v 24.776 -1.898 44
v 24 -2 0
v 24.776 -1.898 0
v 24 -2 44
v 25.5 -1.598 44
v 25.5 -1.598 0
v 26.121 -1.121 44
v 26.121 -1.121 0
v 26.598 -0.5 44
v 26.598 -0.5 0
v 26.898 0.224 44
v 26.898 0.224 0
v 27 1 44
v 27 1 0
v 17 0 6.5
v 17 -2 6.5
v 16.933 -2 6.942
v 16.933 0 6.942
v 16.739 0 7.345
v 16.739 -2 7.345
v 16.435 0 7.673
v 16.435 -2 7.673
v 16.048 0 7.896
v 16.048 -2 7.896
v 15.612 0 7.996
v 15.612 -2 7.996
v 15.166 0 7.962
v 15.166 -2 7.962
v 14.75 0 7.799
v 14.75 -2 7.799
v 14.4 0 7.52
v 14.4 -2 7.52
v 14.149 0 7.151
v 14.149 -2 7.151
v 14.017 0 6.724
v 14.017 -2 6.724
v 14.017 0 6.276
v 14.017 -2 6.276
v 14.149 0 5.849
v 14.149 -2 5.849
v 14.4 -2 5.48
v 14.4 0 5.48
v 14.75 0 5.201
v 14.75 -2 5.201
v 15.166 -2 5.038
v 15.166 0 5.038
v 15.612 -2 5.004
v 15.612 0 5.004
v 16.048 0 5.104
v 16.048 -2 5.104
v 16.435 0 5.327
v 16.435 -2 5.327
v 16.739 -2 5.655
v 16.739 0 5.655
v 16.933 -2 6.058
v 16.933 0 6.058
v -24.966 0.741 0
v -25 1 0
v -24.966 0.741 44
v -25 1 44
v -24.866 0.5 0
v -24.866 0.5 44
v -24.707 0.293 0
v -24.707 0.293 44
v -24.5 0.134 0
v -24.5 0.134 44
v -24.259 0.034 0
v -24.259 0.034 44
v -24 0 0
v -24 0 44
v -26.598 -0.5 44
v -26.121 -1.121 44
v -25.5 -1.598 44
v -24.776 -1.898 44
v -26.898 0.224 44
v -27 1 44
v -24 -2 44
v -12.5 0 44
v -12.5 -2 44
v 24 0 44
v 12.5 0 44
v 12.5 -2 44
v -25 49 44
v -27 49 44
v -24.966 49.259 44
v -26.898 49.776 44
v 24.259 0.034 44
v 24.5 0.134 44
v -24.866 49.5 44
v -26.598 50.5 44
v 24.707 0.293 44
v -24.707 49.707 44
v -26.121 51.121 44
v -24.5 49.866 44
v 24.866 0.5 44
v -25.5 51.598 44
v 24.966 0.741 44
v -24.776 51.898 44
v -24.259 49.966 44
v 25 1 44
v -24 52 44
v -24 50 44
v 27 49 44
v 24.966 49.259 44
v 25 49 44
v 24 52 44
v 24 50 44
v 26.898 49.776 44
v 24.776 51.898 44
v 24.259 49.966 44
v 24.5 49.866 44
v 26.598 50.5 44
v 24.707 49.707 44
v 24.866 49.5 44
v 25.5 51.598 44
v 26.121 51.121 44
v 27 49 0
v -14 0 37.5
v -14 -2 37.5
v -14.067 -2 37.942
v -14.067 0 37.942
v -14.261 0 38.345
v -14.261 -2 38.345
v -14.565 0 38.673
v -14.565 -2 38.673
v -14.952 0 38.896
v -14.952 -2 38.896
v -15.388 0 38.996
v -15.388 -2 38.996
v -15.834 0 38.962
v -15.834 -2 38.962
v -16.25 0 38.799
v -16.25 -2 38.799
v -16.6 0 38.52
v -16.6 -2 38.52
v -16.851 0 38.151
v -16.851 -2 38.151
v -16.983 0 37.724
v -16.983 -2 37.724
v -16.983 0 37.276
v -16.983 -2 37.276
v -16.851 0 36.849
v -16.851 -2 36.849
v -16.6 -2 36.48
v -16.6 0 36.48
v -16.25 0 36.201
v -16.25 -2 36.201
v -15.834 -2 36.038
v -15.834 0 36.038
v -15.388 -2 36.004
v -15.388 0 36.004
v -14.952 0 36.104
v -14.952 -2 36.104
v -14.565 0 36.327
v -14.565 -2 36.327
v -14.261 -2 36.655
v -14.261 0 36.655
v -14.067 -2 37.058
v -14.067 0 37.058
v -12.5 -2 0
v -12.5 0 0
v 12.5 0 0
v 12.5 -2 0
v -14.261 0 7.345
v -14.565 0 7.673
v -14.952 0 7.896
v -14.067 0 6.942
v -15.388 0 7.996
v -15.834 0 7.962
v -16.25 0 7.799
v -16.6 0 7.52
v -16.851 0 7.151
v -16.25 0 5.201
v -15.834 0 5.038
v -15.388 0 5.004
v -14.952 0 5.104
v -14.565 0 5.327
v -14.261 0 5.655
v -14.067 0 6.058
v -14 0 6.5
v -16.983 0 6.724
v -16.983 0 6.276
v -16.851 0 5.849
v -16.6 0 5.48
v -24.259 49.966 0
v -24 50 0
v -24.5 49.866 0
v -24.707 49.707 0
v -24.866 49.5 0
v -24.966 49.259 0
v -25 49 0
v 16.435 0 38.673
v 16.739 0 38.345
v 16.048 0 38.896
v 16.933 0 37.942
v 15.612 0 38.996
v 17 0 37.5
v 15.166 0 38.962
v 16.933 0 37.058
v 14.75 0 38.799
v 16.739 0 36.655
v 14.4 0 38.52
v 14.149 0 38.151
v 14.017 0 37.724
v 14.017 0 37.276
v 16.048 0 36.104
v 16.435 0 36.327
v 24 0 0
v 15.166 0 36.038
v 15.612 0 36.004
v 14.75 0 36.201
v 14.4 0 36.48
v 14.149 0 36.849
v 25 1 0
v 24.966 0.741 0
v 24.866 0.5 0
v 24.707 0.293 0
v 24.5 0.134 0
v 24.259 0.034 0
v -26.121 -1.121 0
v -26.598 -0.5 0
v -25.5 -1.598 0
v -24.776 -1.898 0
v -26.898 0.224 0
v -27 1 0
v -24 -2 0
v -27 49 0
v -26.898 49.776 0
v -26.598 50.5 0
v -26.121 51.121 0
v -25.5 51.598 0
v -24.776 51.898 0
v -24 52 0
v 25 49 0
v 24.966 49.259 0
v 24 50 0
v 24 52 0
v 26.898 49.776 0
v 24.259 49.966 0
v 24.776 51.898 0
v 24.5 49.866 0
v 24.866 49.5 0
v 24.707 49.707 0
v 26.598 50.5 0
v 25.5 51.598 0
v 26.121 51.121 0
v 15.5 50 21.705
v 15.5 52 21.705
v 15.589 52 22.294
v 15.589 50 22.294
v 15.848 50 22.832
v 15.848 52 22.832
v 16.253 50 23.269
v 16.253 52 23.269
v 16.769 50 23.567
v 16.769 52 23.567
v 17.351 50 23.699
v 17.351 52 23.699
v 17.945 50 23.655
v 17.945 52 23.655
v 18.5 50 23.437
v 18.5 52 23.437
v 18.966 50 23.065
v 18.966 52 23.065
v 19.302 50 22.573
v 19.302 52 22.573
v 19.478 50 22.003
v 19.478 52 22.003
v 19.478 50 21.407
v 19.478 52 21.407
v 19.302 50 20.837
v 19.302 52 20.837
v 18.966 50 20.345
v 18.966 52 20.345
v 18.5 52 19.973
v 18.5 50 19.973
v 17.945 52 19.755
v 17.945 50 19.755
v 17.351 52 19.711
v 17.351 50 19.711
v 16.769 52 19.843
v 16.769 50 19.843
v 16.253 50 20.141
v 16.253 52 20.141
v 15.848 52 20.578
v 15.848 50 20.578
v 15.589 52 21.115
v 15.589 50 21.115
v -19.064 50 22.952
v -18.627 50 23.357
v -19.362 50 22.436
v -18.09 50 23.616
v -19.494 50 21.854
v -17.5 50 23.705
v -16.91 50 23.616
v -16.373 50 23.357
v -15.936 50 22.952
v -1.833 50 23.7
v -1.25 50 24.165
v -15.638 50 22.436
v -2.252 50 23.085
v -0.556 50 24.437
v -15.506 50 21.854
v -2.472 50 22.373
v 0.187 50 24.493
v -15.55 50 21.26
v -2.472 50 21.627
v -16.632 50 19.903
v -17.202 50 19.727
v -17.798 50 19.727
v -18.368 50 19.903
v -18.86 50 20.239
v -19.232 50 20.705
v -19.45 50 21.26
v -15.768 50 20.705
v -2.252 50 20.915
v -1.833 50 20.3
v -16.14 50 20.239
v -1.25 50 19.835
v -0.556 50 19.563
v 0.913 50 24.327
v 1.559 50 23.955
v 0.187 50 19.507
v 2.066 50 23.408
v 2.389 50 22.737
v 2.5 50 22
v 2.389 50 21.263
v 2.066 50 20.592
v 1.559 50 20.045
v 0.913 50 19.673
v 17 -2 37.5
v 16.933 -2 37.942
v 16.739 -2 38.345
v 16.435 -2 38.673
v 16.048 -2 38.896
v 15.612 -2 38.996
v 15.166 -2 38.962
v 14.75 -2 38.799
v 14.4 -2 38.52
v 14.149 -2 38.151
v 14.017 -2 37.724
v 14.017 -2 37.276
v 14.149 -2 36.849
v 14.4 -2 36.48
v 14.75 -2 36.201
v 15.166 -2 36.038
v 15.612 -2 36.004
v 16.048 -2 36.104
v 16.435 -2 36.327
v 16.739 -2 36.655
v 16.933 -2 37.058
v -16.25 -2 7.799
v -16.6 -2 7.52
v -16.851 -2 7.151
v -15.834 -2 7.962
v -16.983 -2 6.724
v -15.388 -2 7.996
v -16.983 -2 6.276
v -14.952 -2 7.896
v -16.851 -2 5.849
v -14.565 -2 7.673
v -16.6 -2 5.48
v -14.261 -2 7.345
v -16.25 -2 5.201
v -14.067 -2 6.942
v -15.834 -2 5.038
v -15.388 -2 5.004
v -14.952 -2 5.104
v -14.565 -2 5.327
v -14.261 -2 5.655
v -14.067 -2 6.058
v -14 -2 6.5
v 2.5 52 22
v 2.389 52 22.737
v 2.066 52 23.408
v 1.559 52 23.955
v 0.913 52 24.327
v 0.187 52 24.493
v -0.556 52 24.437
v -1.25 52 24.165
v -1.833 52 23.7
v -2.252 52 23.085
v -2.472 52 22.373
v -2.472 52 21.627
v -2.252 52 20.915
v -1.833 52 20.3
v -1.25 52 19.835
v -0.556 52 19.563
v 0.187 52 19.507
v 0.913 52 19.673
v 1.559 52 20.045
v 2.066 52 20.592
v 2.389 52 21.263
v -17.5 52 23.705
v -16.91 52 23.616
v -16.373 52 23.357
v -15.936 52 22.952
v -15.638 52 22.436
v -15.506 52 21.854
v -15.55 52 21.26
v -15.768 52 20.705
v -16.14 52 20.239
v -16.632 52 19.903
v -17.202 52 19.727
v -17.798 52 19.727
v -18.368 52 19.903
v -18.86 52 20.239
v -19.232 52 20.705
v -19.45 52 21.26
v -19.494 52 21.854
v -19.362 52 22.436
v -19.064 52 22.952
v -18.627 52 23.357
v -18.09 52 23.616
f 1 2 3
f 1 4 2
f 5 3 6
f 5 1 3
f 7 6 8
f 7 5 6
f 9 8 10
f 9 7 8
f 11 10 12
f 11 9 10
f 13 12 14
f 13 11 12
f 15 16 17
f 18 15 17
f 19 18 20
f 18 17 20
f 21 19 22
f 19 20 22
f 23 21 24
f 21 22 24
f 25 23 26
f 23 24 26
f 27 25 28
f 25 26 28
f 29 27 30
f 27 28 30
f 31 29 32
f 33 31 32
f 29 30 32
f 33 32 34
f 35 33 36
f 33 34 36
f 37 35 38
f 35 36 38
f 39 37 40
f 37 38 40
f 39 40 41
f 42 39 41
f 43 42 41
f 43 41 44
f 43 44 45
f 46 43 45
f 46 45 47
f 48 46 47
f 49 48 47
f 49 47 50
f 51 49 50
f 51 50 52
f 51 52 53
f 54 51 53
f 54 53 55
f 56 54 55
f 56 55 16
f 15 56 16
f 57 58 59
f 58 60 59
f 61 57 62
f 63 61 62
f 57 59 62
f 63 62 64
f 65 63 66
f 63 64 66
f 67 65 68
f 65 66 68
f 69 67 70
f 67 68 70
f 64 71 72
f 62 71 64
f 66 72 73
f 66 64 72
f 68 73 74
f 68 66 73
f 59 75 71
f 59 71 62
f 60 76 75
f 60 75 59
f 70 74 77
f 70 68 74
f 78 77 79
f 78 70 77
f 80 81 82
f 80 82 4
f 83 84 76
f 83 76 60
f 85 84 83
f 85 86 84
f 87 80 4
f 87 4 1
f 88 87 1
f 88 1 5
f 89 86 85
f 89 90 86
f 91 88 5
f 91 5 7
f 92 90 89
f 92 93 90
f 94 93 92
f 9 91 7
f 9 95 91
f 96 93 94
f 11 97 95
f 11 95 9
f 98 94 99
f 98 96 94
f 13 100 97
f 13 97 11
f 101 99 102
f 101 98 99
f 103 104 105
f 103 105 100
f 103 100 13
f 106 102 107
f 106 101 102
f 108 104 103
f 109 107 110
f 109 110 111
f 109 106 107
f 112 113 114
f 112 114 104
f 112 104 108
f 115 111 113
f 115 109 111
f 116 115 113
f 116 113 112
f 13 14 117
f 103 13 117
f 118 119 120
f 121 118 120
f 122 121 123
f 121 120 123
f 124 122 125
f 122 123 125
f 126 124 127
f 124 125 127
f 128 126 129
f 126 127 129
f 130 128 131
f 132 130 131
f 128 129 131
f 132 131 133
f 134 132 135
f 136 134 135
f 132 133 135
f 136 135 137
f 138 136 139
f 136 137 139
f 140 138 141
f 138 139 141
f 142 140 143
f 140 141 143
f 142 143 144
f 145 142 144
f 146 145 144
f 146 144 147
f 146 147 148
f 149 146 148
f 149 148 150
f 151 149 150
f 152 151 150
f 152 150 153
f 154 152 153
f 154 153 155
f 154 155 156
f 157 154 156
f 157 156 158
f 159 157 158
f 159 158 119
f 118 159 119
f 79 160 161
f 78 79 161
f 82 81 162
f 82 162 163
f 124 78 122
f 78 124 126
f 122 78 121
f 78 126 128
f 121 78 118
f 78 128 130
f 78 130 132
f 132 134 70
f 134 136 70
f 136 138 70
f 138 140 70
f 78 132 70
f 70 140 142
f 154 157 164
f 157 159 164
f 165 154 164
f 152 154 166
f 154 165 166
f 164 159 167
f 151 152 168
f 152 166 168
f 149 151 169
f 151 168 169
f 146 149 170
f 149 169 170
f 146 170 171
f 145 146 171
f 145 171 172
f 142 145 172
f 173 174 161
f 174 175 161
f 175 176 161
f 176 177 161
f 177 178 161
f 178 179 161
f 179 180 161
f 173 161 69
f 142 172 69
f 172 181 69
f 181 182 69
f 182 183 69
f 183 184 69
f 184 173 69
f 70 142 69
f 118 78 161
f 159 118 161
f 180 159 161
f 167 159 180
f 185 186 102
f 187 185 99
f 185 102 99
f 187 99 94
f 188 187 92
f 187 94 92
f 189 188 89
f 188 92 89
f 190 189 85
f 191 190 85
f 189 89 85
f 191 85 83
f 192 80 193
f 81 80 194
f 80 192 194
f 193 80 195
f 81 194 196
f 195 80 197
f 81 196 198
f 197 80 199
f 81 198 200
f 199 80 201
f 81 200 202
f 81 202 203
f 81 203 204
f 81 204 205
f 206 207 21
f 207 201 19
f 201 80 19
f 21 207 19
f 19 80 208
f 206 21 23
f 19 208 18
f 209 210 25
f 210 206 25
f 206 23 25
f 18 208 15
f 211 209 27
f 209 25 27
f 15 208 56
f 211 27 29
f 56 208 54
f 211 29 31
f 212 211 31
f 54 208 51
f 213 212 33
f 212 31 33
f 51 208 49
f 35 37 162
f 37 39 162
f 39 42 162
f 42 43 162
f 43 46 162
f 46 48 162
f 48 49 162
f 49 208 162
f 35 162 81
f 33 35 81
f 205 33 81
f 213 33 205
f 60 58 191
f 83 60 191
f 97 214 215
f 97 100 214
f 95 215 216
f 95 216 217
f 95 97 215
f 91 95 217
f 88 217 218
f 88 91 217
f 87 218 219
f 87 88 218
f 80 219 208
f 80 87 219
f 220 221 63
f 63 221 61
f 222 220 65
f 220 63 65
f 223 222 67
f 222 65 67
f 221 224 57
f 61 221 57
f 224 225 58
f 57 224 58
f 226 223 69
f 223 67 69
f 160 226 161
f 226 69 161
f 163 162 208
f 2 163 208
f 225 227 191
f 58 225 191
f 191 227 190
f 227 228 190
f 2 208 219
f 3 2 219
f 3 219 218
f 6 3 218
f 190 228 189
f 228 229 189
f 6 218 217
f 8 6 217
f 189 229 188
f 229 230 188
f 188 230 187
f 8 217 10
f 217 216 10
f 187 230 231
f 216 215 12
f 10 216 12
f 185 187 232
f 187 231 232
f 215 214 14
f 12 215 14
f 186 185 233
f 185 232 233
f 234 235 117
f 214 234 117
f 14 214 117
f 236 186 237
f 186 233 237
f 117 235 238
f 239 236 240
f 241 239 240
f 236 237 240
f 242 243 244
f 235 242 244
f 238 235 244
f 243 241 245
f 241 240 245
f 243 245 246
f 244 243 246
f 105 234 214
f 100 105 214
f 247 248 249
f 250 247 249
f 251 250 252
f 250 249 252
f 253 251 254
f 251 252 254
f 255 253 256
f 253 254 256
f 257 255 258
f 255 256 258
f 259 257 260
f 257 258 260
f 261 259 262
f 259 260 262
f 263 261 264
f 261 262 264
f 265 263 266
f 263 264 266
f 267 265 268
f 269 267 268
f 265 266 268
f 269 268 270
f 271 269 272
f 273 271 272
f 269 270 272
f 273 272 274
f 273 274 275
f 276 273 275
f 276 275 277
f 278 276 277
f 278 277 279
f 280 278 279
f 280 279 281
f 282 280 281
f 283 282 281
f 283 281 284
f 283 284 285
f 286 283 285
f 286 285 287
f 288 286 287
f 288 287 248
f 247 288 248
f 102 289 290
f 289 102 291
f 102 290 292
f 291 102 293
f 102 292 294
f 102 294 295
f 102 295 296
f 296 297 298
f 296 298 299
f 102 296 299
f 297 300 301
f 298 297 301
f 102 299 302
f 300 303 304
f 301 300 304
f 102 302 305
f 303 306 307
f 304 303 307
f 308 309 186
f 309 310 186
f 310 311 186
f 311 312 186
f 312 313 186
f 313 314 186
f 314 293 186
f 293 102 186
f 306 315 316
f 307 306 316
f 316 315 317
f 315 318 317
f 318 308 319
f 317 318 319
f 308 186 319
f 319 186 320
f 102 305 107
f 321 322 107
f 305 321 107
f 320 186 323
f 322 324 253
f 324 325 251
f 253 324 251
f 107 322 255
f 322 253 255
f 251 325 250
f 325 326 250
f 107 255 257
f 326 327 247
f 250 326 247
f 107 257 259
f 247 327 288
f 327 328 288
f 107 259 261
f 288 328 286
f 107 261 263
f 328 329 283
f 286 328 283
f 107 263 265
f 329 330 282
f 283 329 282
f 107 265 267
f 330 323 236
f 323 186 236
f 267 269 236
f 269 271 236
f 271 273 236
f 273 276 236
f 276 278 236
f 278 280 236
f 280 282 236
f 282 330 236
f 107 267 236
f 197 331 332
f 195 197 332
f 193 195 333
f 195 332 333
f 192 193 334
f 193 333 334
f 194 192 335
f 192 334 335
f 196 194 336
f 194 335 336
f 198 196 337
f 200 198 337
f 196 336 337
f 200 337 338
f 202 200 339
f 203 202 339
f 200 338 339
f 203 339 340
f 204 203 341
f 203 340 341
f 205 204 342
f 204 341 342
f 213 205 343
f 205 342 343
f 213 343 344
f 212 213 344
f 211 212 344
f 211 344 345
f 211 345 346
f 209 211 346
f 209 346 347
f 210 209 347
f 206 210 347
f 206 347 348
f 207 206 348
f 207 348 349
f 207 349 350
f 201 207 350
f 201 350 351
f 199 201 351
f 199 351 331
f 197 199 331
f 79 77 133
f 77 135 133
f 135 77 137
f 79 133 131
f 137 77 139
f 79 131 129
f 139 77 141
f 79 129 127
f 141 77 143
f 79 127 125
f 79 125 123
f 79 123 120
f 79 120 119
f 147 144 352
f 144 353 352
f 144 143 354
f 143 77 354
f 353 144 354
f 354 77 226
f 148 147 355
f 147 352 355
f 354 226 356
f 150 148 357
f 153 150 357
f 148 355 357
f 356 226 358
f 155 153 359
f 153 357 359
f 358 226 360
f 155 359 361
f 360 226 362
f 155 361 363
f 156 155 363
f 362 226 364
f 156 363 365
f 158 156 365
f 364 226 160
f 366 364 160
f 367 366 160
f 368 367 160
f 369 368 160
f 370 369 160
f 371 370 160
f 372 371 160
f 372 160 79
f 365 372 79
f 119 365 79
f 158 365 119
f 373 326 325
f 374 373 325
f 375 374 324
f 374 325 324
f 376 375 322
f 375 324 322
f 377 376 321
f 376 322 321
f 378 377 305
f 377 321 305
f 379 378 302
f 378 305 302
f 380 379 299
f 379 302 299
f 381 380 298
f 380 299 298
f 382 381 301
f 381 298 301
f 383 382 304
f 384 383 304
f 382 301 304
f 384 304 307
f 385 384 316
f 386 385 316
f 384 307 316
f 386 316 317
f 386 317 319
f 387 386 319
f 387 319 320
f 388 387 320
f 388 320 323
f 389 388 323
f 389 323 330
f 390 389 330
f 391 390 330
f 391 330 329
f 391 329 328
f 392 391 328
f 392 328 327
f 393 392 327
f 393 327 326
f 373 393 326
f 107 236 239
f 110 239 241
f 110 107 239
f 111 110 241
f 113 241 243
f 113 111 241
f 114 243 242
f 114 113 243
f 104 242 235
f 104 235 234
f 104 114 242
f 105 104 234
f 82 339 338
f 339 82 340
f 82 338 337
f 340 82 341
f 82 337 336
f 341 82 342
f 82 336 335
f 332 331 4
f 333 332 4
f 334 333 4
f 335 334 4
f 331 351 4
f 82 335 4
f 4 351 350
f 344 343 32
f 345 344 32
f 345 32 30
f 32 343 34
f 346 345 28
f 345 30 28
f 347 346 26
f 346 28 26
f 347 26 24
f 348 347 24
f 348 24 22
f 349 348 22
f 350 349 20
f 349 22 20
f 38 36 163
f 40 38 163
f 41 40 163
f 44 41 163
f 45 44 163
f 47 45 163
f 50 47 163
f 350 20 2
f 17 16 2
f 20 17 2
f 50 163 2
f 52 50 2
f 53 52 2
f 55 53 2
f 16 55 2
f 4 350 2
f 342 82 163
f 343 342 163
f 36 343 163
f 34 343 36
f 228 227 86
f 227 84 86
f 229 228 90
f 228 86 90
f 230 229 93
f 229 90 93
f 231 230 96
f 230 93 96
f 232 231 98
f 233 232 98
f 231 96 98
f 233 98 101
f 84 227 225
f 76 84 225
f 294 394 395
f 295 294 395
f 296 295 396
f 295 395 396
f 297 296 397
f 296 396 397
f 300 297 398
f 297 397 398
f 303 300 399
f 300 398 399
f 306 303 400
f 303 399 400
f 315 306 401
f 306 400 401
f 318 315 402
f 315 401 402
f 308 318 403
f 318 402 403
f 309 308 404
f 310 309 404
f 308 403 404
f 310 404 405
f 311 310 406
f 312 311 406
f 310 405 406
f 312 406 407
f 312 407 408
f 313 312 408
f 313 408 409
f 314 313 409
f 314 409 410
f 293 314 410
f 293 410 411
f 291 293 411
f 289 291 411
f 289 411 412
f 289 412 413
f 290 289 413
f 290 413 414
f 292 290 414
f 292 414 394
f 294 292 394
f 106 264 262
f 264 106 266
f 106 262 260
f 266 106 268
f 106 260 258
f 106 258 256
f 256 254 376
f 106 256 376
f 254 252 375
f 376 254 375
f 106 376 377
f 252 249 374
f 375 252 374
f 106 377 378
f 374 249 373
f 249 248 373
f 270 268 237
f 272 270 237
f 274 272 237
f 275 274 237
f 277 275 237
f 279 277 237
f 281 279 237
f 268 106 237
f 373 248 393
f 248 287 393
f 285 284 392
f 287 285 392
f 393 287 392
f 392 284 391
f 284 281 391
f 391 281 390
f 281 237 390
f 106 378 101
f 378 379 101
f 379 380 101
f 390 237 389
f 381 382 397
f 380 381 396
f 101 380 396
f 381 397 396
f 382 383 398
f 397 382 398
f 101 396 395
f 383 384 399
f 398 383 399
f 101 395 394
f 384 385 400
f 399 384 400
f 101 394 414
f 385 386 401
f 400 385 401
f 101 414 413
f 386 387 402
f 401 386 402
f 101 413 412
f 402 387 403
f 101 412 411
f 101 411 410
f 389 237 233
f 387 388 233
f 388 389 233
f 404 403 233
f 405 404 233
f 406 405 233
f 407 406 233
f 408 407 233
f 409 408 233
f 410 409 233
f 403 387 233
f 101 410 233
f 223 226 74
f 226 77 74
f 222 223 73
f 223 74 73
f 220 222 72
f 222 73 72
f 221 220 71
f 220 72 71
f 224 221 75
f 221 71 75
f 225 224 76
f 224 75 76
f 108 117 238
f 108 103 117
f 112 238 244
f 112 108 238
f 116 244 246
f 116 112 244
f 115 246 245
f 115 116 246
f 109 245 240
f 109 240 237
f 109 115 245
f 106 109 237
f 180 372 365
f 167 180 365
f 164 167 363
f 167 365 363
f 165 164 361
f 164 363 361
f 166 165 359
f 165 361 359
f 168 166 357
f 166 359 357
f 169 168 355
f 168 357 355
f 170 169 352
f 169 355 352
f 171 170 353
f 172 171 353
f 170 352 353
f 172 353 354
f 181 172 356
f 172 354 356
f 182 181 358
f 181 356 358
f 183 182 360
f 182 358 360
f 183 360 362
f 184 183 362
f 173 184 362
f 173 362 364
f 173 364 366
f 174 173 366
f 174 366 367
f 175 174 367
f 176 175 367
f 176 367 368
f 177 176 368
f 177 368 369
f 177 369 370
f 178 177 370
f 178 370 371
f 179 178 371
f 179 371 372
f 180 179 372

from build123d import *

# Parameters (mm, degrees)
BOSS_EXTRUDE1_DEPTH = 44
SKETCH2_R           = 1.5
CUT_EXTRUDE1_DEPTH  = 32
SKETCH3_R           = 2.5
CUT_EXTRUDE2_DEPTH  = 74.273460407
SKETCH4_R           = 2
CUT_EXTRUDE3_DEPTH  = 44
FILLET1_R           = 1
FILLET2_R           = 3


with BuildPart() as part:
    # Sketch1 → Boss-Extrude1 (new body)
    with BuildSketch(Plane.XY):
        Polygon((-25, 50), (25, 50), (25, 0), (12.5, 0), (12.5, -2), (27, -2), (27, 52), (-27, 52), (-27, -2), (-12.5, -2), (-12.5, 0), (-25, 0), align=None)
    extrude(amount=BOSS_EXTRUDE1_DEPTH)

    # Sketch2 → Cut-Extrude1 (cut)
    with BuildSketch(Plane(origin=(0, -2, 0), x_dir=(-1, 0, 0), z_dir=(0, -1, 0))):
        with Locations(Location((15.5, -37.5, 0), (0, 0, 180))):
            Circle(SKETCH2_R)
        with Locations(Location((-15.5, -37.5, 0), (0, 0, 180))):
            Circle(SKETCH2_R)
        with Locations(Location((-15.5, -6.5, 0), (0, 0, 180))):
            Circle(SKETCH2_R)
        with Locations(Location((15.5, -6.5, 0), (0, 0, 180))):
            Circle(SKETCH2_R)
    extrude(amount=-CUT_EXTRUDE1_DEPTH, mode=Mode.SUBTRACT)

    # Sketch3 → Cut-Extrude2 (cut, through all)
    with BuildSketch(Plane.XZ.offset(-50)):
        with Locations((0, 22)):
            Circle(SKETCH3_R)
    extrude(amount=-CUT_EXTRUDE2_DEPTH, mode=Mode.SUBTRACT)

    # Sketch4 → Cut-Extrude3 (cut)
    with BuildSketch(Plane(origin=(0, 52, 0), x_dir=(1, 0, 0), z_dir=(0, 1, 0))):
        with Locations(Location((-17.5, -21.704916057, 0), (0, 0, 270))):
            Circle(SKETCH4_R)
        with Locations(Location((17.5, -21.704916057, 0), (0, 0, 180))):
            Circle(SKETCH4_R)
    extrude(amount=-CUT_EXTRUDE3_DEPTH, mode=Mode.SUBTRACT)

    # Fillet1
    fillet1_edges = [part.edges().sort_by_distance(p)[0] for p in [
        (25, 0, 22),
        (25, 50, 22),
        (-25, 50, 22),
        (-25, 0, 22),
    ]]
    fillet(fillet1_edges, radius=FILLET1_R)

    # Fillet2
    fillet2_edges = [part.edges().sort_by_distance(p)[0] for p in [
        (-27, -2, 22),
        (-27, 52, 22),
        (27, 52, 22),
        (27, -2, 22),
    ]]
    fillet(fillet2_edges, radius=FILLET2_R)


solid = part.part
